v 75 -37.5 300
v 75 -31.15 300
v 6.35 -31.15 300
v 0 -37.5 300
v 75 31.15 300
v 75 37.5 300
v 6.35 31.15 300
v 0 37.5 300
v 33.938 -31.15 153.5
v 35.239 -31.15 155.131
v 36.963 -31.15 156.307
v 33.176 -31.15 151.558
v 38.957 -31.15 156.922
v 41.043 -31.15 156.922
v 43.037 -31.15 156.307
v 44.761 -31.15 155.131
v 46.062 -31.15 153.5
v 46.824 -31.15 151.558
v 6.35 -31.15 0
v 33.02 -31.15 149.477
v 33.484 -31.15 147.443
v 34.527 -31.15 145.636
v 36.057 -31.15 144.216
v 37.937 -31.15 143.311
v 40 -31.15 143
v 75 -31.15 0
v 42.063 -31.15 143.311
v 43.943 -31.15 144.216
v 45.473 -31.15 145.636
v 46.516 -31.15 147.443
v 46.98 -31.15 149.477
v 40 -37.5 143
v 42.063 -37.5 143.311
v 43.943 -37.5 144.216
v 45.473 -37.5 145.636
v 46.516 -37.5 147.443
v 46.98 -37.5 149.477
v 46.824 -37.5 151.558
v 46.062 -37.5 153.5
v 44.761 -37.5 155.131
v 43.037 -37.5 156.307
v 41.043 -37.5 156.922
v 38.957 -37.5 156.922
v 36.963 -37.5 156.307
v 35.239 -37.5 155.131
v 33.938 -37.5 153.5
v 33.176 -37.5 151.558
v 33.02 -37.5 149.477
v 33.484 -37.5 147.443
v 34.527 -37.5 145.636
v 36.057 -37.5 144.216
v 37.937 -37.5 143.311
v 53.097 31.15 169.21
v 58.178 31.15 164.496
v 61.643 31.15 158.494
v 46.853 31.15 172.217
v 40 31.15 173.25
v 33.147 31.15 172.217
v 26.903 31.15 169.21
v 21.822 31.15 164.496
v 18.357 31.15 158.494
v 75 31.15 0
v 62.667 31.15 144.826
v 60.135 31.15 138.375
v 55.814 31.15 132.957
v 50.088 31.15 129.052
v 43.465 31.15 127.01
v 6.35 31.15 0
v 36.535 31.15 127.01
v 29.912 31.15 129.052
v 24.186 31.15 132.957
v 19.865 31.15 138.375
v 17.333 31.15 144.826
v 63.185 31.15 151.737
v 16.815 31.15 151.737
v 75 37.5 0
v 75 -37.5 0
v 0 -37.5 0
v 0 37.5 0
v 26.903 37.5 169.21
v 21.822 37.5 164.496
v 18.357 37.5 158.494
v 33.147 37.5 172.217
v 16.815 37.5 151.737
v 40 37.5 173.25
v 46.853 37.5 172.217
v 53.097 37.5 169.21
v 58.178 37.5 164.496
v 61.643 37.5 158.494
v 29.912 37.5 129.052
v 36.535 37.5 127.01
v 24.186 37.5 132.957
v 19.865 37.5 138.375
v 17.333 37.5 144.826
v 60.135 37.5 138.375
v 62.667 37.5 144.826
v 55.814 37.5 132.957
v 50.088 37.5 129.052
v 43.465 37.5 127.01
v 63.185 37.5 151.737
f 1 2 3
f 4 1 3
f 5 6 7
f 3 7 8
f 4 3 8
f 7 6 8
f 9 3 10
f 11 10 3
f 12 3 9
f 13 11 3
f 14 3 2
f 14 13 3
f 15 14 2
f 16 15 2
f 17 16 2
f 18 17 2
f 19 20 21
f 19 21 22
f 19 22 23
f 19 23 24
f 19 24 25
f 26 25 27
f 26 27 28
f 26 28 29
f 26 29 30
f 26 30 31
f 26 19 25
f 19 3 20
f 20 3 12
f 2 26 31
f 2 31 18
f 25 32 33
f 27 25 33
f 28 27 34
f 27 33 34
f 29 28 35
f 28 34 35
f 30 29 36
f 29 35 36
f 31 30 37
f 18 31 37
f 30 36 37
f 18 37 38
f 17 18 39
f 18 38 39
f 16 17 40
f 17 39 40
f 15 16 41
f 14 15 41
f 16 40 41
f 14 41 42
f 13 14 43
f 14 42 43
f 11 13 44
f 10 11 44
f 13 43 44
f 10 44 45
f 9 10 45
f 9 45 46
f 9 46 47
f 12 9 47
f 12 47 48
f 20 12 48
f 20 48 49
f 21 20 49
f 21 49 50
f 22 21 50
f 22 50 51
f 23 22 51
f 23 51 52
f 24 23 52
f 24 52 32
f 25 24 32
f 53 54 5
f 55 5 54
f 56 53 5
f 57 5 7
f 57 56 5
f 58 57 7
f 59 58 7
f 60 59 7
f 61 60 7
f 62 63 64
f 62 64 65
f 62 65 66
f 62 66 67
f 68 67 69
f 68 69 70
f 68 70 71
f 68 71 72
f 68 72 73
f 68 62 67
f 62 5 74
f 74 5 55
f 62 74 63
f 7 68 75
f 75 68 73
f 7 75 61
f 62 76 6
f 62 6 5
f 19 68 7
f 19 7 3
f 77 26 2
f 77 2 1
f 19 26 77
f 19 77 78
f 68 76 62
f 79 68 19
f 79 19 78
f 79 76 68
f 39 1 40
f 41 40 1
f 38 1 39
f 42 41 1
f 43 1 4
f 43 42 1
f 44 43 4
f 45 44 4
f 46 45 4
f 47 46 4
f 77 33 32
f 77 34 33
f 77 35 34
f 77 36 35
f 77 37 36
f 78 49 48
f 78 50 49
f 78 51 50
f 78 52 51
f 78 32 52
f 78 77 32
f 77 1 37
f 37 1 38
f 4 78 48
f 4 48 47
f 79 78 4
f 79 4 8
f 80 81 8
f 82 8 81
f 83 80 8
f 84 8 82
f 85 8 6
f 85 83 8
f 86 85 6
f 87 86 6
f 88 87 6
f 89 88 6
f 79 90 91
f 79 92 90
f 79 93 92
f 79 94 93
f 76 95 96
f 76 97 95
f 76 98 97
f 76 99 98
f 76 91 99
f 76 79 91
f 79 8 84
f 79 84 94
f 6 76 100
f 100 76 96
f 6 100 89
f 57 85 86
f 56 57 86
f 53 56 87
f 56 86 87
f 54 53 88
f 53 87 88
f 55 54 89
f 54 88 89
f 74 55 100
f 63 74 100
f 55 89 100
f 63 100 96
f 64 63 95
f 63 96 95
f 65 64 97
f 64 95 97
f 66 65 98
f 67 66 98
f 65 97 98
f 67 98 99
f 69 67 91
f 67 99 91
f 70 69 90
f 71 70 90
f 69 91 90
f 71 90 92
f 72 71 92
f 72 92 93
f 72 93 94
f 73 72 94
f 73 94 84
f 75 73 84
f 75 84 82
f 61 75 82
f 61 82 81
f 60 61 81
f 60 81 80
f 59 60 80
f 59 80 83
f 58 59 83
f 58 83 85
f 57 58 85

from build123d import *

# Parameters (mm, degrees)
BOSS_EXTRUDE1_DEPTH = 300
SKETCH2_R           = 23.25
CUT_EXTRUDE1_DEPTH  = 10
SKETCH3_R           = 7
CUT_EXTRUDE2_DEPTH  = 10


with BuildPart() as part:
    # Sketch1 → Boss-Extrude1 (new body)
    with BuildSketch(Plane.XY):
        Polygon((0, -37.5), (0, 37.5), (75, 37.5), (75, 31.15), (6.35, 31.15), (6.35, -31.15), (75, -31.15), (75, -37.5), align=None)
    extrude(amount=BOSS_EXTRUDE1_DEPTH)

    # Sketch2 → Cut-Extrude1 (cut)
    with BuildSketch(Plane(origin=(0, 37.5, 0), x_dir=(1, 0, 0), z_dir=(0, 1, 0))):
        with Locations(Location((40, -150, 0), (0, 0, 270))):
            Circle(SKETCH2_R)
    extrude(amount=-CUT_EXTRUDE1_DEPTH, mode=Mode.SUBTRACT)

    # Sketch3 → Cut-Extrude2 (cut)
    with BuildSketch(Plane.XZ.offset(37.5)):
        with Locations(Location((40, 150, 0), (0, 0, 270))):
            Circle(SKETCH3_R)
    extrude(amount=-CUT_EXTRUDE2_DEPTH, mode=Mode.SUBTRACT)


solid = part.part
